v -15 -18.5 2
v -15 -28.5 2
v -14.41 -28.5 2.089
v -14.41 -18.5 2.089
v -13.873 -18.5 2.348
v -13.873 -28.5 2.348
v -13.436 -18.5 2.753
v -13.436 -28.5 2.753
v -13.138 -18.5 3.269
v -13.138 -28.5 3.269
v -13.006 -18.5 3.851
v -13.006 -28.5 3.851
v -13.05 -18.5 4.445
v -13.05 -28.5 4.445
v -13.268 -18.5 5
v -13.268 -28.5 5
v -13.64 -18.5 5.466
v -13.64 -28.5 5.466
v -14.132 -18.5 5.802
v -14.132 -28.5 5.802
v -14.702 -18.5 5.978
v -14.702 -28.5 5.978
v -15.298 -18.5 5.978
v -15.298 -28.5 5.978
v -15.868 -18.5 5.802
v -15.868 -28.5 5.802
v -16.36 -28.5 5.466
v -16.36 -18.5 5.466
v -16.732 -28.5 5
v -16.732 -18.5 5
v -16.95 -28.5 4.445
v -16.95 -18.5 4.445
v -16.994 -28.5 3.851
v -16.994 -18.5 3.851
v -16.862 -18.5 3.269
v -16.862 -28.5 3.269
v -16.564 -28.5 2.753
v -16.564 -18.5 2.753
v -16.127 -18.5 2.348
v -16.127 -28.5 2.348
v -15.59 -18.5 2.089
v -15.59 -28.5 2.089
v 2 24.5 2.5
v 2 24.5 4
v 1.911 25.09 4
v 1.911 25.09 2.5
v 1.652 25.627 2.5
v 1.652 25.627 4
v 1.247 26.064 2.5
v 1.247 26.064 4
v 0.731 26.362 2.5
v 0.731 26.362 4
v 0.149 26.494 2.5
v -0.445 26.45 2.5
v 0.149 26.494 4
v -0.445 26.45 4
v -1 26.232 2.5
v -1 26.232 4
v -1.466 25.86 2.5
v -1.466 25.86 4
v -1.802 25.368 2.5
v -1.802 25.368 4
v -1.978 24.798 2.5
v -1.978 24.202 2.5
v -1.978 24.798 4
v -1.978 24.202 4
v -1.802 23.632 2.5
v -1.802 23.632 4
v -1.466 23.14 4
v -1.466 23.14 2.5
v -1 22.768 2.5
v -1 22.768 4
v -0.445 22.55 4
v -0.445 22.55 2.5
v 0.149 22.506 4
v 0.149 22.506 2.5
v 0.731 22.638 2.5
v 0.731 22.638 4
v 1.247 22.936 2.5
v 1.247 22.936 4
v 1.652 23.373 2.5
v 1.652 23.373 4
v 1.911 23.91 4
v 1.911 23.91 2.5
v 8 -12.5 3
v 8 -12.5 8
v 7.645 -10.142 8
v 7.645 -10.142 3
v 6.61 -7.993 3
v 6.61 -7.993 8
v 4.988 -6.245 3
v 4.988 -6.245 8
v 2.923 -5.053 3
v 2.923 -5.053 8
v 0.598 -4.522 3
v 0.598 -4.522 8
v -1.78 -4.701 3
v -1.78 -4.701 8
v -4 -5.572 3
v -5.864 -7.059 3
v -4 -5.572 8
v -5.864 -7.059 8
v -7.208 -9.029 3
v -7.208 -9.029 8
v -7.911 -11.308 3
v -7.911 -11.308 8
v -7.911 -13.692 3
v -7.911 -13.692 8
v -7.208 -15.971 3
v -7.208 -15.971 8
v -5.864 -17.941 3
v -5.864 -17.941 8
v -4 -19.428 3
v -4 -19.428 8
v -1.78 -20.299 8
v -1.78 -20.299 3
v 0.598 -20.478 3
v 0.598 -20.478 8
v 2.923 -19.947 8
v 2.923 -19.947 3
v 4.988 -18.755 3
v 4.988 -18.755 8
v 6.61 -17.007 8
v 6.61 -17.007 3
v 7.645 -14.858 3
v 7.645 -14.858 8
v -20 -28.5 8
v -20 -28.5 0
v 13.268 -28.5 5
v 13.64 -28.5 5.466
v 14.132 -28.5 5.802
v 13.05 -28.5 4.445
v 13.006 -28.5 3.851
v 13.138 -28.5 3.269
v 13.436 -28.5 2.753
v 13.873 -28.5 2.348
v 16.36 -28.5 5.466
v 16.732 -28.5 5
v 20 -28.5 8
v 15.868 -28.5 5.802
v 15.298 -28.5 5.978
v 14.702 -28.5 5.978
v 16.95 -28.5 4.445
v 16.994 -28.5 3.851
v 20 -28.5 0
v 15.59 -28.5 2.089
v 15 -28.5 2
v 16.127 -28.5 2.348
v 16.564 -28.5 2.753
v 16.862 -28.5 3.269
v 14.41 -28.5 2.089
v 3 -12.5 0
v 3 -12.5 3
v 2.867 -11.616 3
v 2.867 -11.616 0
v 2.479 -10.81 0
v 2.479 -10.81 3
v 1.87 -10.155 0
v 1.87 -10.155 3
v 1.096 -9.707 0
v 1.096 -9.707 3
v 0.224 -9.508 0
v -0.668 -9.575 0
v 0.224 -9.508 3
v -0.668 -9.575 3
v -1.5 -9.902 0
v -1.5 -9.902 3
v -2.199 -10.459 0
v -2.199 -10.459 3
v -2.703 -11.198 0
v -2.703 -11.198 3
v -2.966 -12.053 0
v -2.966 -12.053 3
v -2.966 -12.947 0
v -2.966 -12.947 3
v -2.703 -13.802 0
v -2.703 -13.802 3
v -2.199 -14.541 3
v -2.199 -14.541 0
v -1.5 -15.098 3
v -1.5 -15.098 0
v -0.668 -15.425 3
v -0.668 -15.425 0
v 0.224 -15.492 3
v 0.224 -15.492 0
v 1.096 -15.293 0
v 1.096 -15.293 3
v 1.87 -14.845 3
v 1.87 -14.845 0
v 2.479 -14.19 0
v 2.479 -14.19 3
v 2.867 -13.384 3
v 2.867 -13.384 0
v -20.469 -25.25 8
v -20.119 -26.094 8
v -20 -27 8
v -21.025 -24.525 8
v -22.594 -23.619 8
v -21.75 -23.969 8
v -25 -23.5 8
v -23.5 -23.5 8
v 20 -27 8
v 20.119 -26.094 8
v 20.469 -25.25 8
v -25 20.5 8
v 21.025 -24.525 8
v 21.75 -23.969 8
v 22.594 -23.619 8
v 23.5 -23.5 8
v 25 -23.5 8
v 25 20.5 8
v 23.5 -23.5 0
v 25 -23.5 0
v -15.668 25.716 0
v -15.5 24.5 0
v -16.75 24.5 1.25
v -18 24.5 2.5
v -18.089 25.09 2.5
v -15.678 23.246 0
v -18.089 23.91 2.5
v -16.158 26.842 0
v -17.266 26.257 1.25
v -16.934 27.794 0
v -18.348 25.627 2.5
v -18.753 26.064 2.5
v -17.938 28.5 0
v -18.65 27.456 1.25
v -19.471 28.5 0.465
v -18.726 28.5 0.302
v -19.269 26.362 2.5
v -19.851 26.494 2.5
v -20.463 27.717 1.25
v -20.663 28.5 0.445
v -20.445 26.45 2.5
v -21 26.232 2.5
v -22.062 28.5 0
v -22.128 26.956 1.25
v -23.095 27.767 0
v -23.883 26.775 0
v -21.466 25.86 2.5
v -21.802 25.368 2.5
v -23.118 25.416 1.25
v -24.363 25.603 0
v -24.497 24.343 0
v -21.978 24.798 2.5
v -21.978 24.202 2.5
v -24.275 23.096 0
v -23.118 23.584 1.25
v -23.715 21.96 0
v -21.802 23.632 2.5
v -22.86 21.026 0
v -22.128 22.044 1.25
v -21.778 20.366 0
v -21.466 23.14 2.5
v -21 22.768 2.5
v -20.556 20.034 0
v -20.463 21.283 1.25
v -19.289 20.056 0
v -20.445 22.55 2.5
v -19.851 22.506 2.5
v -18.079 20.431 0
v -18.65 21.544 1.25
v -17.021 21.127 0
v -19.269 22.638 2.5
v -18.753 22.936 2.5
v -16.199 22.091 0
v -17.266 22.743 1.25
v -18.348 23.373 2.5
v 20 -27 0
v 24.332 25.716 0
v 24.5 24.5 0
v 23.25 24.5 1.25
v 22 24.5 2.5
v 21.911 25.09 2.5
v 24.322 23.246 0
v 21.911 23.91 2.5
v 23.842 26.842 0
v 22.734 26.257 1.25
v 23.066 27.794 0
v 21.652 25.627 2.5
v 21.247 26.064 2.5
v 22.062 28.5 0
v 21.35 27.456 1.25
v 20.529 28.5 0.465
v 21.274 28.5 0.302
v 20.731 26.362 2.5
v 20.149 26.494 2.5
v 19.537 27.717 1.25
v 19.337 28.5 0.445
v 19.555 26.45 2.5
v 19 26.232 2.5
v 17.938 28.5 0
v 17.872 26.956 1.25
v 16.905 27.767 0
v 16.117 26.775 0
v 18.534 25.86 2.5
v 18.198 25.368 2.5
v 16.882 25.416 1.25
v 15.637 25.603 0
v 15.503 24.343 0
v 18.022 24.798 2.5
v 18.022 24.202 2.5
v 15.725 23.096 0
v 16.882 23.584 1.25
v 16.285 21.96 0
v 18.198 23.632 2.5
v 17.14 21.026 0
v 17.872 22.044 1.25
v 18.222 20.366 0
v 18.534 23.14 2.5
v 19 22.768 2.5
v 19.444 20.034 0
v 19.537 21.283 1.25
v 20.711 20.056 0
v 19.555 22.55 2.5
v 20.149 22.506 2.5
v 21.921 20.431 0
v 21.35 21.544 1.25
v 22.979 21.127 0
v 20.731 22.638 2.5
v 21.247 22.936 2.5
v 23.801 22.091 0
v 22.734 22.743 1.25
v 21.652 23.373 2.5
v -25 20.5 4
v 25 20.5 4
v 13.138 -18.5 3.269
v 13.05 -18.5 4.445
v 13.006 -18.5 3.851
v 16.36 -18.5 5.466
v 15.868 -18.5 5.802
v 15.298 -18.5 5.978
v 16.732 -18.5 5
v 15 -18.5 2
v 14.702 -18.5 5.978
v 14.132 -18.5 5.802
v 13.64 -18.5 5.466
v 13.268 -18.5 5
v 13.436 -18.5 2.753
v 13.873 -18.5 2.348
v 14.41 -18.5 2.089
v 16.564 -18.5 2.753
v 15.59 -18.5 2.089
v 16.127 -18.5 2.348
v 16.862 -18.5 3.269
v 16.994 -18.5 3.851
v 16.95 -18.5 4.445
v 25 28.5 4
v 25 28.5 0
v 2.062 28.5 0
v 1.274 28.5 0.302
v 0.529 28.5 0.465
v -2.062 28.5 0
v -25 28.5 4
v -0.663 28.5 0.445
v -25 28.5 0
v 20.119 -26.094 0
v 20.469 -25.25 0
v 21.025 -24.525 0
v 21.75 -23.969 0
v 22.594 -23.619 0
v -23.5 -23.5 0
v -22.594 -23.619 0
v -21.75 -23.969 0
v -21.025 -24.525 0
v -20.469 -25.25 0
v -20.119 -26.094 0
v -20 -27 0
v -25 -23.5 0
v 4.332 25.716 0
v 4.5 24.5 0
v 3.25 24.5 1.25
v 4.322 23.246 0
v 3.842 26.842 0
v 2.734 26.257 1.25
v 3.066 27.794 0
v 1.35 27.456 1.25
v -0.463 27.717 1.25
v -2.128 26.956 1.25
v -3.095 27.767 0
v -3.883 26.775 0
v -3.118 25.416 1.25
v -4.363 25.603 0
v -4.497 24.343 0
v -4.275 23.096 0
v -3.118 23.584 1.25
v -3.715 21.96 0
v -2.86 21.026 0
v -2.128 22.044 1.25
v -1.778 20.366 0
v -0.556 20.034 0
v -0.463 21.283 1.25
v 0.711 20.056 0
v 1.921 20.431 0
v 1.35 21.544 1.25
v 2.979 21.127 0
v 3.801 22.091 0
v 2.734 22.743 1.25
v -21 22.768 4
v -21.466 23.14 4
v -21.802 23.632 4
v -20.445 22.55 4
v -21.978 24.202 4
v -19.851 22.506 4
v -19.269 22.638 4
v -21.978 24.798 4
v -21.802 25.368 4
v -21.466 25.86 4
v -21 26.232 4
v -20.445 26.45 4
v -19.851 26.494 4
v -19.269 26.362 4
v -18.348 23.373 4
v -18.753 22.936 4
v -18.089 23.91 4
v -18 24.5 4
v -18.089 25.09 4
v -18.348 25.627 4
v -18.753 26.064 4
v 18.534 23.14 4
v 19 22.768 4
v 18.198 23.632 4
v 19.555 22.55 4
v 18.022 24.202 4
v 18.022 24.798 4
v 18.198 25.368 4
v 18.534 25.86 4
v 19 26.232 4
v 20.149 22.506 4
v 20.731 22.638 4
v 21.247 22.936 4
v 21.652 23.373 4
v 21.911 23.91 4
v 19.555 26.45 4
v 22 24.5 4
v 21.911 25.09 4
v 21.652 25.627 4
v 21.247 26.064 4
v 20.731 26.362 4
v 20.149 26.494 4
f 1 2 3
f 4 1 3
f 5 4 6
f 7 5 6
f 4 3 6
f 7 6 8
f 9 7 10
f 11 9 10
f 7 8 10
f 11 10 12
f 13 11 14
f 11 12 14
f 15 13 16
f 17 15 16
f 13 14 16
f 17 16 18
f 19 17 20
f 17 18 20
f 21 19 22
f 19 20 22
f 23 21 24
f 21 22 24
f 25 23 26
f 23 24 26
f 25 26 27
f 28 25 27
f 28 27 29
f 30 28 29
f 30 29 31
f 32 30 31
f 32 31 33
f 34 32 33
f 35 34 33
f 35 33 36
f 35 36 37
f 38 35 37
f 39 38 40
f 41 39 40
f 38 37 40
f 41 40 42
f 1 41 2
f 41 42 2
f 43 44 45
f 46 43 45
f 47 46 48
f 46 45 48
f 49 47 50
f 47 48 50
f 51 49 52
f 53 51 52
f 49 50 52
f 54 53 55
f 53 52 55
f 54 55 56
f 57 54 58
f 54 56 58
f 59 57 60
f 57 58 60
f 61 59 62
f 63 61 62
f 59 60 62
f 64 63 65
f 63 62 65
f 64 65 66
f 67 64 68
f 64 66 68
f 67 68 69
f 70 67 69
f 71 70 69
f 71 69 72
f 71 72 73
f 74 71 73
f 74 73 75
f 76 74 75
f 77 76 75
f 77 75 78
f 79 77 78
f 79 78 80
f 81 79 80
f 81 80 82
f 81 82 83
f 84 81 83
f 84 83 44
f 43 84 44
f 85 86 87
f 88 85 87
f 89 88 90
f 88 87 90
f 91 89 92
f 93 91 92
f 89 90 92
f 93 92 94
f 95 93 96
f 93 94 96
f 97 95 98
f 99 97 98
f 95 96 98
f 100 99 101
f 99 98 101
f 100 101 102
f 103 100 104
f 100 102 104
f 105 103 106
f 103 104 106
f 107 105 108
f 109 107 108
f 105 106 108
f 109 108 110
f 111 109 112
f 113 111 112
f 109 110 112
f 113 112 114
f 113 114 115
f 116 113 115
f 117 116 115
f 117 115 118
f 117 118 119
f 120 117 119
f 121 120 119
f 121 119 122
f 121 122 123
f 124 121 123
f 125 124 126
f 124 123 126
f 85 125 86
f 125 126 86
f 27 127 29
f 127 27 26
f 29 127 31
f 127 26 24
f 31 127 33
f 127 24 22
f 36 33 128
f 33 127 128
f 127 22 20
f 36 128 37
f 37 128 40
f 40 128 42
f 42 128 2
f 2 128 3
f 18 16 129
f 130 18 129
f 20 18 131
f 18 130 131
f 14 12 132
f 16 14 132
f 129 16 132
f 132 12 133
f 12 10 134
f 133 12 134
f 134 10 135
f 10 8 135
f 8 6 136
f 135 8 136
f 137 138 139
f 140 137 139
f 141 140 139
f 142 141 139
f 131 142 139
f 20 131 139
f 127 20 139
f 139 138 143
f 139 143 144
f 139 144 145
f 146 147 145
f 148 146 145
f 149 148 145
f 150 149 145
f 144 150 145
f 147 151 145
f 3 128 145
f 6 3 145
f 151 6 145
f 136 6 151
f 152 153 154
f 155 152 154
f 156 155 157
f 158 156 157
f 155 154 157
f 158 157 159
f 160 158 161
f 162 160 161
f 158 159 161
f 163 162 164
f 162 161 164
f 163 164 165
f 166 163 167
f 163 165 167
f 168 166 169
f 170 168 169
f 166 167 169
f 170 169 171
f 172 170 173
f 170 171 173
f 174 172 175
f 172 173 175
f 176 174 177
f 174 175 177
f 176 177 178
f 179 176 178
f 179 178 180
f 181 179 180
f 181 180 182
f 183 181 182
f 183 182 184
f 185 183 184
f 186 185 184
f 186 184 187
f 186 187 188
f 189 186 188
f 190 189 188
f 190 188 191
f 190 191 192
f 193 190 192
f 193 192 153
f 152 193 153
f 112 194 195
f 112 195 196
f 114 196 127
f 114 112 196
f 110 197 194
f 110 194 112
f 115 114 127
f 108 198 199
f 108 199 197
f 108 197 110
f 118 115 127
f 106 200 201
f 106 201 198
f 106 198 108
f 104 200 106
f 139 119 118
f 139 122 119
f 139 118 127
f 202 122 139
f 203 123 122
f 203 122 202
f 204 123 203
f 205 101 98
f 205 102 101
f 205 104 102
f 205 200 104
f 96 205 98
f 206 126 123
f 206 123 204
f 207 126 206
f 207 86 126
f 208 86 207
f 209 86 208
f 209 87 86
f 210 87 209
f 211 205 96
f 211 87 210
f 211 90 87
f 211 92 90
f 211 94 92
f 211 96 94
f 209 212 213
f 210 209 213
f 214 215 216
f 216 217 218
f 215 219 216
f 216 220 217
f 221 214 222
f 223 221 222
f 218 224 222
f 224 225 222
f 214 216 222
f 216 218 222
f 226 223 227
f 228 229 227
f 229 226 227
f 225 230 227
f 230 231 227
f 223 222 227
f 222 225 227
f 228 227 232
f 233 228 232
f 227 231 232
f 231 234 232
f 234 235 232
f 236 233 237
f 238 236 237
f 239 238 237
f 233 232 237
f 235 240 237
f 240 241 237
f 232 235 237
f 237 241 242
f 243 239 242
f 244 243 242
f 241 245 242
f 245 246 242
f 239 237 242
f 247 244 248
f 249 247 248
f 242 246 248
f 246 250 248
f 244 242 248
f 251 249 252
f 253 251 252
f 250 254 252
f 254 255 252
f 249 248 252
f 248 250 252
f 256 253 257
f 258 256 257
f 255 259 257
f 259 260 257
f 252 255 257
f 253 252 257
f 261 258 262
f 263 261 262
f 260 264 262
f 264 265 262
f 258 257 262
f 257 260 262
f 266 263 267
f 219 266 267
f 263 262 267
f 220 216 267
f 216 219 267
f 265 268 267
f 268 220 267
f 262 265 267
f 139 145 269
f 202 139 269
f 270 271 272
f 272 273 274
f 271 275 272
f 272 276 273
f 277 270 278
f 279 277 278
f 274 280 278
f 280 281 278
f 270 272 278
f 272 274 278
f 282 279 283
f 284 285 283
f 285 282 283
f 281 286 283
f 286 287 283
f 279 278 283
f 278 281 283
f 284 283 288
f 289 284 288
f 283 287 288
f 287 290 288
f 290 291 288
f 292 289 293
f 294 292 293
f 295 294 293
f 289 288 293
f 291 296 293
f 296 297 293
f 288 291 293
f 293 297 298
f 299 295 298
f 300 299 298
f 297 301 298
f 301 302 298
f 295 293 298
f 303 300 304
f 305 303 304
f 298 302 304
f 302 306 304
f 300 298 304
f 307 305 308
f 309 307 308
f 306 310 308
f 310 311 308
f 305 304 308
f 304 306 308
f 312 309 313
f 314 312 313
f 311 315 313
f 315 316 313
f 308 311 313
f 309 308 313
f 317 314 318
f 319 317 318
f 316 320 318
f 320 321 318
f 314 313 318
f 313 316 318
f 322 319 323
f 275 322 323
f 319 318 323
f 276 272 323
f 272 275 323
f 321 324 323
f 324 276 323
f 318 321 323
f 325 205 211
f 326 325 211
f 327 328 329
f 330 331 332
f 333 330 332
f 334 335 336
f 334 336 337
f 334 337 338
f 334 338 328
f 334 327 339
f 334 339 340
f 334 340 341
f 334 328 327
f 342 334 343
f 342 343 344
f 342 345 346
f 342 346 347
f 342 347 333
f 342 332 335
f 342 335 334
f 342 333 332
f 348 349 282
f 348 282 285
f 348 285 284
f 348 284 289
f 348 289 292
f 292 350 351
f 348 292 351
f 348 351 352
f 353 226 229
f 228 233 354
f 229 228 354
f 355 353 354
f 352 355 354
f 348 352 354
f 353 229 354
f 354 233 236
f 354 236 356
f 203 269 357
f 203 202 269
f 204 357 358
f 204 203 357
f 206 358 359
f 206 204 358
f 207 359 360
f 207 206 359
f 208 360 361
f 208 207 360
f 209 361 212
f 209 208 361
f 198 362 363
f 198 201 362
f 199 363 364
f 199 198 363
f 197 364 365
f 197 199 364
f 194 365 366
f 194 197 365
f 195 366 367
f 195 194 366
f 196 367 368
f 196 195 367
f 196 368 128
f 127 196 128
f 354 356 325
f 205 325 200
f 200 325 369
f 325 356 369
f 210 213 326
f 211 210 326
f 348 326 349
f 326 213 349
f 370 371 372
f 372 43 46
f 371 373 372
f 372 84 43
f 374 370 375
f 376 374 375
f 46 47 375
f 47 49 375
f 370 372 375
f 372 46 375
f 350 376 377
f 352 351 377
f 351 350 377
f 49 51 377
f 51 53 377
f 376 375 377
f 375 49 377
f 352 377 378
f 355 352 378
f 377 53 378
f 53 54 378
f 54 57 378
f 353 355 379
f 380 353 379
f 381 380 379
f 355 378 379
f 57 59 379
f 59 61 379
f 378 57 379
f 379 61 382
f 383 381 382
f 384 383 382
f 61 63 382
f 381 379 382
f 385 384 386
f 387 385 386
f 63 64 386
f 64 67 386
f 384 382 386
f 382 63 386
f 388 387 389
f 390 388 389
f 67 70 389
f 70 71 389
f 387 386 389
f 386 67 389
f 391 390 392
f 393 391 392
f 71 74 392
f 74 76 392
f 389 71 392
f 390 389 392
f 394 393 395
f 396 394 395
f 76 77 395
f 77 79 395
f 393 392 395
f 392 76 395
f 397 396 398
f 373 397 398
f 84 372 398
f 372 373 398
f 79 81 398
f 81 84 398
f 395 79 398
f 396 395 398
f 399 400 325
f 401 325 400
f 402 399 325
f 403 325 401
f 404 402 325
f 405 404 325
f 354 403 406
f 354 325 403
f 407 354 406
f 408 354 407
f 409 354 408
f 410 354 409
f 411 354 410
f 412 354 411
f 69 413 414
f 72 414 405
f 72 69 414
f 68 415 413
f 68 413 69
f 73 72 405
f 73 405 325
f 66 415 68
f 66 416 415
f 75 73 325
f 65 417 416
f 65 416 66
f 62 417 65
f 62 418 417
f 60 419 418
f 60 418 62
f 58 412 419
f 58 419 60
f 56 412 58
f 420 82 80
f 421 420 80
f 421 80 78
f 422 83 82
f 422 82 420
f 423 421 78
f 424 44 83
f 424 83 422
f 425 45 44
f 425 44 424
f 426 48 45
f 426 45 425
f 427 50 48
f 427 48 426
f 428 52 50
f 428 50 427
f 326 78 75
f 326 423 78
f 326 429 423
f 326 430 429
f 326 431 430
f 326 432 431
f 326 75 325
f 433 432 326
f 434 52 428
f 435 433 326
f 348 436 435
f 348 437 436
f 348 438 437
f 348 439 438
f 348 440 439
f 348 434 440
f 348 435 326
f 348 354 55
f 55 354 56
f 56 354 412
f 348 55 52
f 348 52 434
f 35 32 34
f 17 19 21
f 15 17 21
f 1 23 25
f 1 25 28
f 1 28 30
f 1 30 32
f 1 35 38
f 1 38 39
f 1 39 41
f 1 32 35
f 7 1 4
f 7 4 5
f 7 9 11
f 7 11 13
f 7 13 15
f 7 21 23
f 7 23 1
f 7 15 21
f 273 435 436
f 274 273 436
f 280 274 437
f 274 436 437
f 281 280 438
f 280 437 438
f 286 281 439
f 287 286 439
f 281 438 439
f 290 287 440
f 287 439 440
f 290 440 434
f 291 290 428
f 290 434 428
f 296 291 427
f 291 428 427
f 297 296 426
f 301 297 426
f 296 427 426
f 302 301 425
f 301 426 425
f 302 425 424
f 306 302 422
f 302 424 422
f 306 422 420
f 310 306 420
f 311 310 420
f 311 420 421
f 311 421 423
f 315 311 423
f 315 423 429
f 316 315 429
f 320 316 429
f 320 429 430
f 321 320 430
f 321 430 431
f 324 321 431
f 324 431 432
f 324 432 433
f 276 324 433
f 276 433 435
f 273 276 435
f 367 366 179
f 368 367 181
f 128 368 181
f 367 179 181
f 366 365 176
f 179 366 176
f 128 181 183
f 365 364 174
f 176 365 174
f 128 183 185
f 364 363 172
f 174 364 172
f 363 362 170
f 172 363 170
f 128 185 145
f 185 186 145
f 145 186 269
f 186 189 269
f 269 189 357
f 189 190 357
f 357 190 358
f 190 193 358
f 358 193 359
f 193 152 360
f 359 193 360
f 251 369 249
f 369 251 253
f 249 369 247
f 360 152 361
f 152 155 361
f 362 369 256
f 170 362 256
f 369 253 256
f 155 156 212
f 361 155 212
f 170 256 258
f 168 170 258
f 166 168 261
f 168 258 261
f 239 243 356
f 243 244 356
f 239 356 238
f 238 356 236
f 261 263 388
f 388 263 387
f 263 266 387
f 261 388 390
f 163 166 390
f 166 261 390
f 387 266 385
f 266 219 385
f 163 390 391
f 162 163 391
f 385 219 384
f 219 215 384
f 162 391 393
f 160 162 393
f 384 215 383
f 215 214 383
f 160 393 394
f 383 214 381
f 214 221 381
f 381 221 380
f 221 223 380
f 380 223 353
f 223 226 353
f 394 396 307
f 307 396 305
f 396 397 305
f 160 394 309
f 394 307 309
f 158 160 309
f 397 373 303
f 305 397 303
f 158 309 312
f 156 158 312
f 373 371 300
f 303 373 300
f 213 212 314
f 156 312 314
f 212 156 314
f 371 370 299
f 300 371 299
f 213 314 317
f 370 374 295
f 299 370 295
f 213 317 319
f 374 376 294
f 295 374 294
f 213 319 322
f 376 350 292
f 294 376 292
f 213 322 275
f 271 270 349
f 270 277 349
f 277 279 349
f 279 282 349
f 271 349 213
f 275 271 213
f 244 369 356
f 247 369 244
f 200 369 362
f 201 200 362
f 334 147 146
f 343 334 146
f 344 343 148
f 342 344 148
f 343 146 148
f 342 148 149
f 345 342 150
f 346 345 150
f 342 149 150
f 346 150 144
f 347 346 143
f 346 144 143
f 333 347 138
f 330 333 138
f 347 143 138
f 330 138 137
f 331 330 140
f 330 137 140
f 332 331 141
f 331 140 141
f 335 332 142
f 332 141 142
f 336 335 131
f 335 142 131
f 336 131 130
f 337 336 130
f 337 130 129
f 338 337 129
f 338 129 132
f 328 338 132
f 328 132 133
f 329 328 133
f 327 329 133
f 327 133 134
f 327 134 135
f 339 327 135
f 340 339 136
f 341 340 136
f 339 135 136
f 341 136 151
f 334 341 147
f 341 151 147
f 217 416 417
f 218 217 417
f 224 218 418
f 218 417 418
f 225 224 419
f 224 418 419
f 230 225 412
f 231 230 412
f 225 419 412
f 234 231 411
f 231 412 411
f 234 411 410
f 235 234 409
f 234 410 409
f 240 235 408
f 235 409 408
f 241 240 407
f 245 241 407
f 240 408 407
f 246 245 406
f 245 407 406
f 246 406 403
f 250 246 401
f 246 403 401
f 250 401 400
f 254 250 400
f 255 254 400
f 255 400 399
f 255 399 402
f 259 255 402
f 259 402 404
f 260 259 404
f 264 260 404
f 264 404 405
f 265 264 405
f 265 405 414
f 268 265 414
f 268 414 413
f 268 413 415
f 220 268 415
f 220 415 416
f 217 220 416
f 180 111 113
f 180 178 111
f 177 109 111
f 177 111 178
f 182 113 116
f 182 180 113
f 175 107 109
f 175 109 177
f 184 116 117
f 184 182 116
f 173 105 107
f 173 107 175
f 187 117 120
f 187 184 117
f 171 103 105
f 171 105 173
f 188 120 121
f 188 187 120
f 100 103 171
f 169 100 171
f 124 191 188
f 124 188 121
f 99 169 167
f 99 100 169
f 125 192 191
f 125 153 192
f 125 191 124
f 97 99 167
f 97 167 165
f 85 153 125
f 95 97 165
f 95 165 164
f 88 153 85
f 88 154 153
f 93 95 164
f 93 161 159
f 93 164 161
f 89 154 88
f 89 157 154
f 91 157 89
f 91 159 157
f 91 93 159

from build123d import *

# Parameters (mm, degrees)
BOSS_EXTRU_1_DEPTH      = 8
ESQUISSE2_R             = 2
ENL_V_MAT_EXTRU_1_DEPTH = 10
ESQUISSE3_R             = 2
ENL_V_MAT_EXTRU_2_DEPTH = 39.745967532
CHANFREIN1_SIZE         = 2.5
ESQUISSE4_R             = 8
ENL_V_MAT_EXTRU_3_DEPTH = 5
ESQUISSE5_R             = 3
ENL_V_MAT_EXTRU_4_DEPTH = 39.23937761
ESQUISSE6_W             = 50
ESQUISSE6_H             = 8
ENL_V_MAT_EXTRU_5_DEPTH = 4
CONG_1_R                = 3.5


with BuildPart() as part:
    # Esquisse1 → Boss.-Extru.1 (new body)
    with BuildSketch(Plane.XY):
        Polygon((-25, -23.5), (-20, -23.5), (-20, -28.5), (20, -28.5), (20, -23.5), (25, -23.5), (25, 28.5), (-25, 28.5), align=None)
    extrude(amount=BOSS_EXTRU_1_DEPTH)

    # Esquisse2 → Enlèv. mat.-Extru.1 (cut)
    with BuildSketch(Plane.XZ.offset(28.5)):
        with Locations(Location((-15, 4, 0), (0, 0, 270))):
            Circle(ESQUISSE2_R)
        with Locations(Location((15, 4, 0), (0, 0, 270))):
            Circle(ESQUISSE2_R)
    extrude(amount=-ENL_V_MAT_EXTRU_1_DEPTH, mode=Mode.SUBTRACT)

    # Esquisse3 → Enlèv. mat.-Extru.2 (cut, through all)
    with BuildSketch(Plane.XY.offset(8)):
        with Locations((-20, 24.5)):
            Circle(ESQUISSE3_R)
        with Locations((20, 24.5)):
            Circle(ESQUISSE3_R)
        with Locations((0, 24.5)):
            Circle(ESQUISSE3_R)
    extrude(amount=-ENL_V_MAT_EXTRU_2_DEPTH, mode=Mode.SUBTRACT)

    # Chanfrein1
    # the kernel refuses this chamfer: 2.5 mm, written as the material it takes off along each edge
    with BuildSketch(Plane(origin=(-20, 24.5, 0), x_dir=(1, 0, 0), z_dir=(0, -1, 0))) as chanfrein1_piece_1:
        Polygon((2 + CHANFREIN1_SIZE, 0), (2, CHANFREIN1_SIZE), (2, 0), align=None)
    revolve(axis=Axis((-20, 24.5, 0), (0, 0, 1)), mode=Mode.SUBTRACT)
    with BuildSketch(Plane(origin=(20, 24.5, 0), x_dir=(1, 0, 0), z_dir=(0, -1, 0))) as chanfrein1_piece_2:
        Polygon((2 + CHANFREIN1_SIZE, 0), (2, CHANFREIN1_SIZE), (2, 0), align=None)
    revolve(axis=Axis((20, 24.5, 0), (0, 0, 1)), mode=Mode.SUBTRACT)
    with BuildSketch(Plane(origin=(0, 24.5, 0), x_dir=(1, 0, 0), z_dir=(0, -1, 0))) as chanfrein1_piece_3:
        Polygon((2 + CHANFREIN1_SIZE, 0), (2, CHANFREIN1_SIZE), (2, 0), align=None)
    revolve(axis=Axis((0, 24.5, 0), (0, 0, 1)), mode=Mode.SUBTRACT)

    # Esquisse4 → Enlèv. mat.-Extru.3 (cut)
    with BuildSketch(Plane.XY.offset(8)):
        with Locations((0, -12.5)):
            Circle(ESQUISSE4_R)
    extrude(amount=-ENL_V_MAT_EXTRU_3_DEPTH, mode=Mode.SUBTRACT)

    # Esquisse5 → Enlèv. mat.-Extru.4 (cut, through all)
    with BuildSketch(Plane.XY.offset(3)):
        with Locations((0, -12.5)):
            Circle(ESQUISSE5_R)
    extrude(amount=-ENL_V_MAT_EXTRU_4_DEPTH, mode=Mode.SUBTRACT)

    # Esquisse6 → Enlèv. mat.-Extru.5 (cut)
    with BuildSketch(Plane.XY.offset(8)):
        with Locations((0, 24.5)):
            Rectangle(ESQUISSE6_W, ESQUISSE6_H)
    extrude(amount=-ENL_V_MAT_EXTRU_5_DEPTH, mode=Mode.SUBTRACT)

    # Congé1
    cong_1_edges = [part.edges().sort_by_distance(p)[0] for p in [
        (20, -23.5, 4),
        (-20, -23.5, 4),
    ]]
    fillet(cong_1_edges, radius=CONG_1_R)


solid = part.part
